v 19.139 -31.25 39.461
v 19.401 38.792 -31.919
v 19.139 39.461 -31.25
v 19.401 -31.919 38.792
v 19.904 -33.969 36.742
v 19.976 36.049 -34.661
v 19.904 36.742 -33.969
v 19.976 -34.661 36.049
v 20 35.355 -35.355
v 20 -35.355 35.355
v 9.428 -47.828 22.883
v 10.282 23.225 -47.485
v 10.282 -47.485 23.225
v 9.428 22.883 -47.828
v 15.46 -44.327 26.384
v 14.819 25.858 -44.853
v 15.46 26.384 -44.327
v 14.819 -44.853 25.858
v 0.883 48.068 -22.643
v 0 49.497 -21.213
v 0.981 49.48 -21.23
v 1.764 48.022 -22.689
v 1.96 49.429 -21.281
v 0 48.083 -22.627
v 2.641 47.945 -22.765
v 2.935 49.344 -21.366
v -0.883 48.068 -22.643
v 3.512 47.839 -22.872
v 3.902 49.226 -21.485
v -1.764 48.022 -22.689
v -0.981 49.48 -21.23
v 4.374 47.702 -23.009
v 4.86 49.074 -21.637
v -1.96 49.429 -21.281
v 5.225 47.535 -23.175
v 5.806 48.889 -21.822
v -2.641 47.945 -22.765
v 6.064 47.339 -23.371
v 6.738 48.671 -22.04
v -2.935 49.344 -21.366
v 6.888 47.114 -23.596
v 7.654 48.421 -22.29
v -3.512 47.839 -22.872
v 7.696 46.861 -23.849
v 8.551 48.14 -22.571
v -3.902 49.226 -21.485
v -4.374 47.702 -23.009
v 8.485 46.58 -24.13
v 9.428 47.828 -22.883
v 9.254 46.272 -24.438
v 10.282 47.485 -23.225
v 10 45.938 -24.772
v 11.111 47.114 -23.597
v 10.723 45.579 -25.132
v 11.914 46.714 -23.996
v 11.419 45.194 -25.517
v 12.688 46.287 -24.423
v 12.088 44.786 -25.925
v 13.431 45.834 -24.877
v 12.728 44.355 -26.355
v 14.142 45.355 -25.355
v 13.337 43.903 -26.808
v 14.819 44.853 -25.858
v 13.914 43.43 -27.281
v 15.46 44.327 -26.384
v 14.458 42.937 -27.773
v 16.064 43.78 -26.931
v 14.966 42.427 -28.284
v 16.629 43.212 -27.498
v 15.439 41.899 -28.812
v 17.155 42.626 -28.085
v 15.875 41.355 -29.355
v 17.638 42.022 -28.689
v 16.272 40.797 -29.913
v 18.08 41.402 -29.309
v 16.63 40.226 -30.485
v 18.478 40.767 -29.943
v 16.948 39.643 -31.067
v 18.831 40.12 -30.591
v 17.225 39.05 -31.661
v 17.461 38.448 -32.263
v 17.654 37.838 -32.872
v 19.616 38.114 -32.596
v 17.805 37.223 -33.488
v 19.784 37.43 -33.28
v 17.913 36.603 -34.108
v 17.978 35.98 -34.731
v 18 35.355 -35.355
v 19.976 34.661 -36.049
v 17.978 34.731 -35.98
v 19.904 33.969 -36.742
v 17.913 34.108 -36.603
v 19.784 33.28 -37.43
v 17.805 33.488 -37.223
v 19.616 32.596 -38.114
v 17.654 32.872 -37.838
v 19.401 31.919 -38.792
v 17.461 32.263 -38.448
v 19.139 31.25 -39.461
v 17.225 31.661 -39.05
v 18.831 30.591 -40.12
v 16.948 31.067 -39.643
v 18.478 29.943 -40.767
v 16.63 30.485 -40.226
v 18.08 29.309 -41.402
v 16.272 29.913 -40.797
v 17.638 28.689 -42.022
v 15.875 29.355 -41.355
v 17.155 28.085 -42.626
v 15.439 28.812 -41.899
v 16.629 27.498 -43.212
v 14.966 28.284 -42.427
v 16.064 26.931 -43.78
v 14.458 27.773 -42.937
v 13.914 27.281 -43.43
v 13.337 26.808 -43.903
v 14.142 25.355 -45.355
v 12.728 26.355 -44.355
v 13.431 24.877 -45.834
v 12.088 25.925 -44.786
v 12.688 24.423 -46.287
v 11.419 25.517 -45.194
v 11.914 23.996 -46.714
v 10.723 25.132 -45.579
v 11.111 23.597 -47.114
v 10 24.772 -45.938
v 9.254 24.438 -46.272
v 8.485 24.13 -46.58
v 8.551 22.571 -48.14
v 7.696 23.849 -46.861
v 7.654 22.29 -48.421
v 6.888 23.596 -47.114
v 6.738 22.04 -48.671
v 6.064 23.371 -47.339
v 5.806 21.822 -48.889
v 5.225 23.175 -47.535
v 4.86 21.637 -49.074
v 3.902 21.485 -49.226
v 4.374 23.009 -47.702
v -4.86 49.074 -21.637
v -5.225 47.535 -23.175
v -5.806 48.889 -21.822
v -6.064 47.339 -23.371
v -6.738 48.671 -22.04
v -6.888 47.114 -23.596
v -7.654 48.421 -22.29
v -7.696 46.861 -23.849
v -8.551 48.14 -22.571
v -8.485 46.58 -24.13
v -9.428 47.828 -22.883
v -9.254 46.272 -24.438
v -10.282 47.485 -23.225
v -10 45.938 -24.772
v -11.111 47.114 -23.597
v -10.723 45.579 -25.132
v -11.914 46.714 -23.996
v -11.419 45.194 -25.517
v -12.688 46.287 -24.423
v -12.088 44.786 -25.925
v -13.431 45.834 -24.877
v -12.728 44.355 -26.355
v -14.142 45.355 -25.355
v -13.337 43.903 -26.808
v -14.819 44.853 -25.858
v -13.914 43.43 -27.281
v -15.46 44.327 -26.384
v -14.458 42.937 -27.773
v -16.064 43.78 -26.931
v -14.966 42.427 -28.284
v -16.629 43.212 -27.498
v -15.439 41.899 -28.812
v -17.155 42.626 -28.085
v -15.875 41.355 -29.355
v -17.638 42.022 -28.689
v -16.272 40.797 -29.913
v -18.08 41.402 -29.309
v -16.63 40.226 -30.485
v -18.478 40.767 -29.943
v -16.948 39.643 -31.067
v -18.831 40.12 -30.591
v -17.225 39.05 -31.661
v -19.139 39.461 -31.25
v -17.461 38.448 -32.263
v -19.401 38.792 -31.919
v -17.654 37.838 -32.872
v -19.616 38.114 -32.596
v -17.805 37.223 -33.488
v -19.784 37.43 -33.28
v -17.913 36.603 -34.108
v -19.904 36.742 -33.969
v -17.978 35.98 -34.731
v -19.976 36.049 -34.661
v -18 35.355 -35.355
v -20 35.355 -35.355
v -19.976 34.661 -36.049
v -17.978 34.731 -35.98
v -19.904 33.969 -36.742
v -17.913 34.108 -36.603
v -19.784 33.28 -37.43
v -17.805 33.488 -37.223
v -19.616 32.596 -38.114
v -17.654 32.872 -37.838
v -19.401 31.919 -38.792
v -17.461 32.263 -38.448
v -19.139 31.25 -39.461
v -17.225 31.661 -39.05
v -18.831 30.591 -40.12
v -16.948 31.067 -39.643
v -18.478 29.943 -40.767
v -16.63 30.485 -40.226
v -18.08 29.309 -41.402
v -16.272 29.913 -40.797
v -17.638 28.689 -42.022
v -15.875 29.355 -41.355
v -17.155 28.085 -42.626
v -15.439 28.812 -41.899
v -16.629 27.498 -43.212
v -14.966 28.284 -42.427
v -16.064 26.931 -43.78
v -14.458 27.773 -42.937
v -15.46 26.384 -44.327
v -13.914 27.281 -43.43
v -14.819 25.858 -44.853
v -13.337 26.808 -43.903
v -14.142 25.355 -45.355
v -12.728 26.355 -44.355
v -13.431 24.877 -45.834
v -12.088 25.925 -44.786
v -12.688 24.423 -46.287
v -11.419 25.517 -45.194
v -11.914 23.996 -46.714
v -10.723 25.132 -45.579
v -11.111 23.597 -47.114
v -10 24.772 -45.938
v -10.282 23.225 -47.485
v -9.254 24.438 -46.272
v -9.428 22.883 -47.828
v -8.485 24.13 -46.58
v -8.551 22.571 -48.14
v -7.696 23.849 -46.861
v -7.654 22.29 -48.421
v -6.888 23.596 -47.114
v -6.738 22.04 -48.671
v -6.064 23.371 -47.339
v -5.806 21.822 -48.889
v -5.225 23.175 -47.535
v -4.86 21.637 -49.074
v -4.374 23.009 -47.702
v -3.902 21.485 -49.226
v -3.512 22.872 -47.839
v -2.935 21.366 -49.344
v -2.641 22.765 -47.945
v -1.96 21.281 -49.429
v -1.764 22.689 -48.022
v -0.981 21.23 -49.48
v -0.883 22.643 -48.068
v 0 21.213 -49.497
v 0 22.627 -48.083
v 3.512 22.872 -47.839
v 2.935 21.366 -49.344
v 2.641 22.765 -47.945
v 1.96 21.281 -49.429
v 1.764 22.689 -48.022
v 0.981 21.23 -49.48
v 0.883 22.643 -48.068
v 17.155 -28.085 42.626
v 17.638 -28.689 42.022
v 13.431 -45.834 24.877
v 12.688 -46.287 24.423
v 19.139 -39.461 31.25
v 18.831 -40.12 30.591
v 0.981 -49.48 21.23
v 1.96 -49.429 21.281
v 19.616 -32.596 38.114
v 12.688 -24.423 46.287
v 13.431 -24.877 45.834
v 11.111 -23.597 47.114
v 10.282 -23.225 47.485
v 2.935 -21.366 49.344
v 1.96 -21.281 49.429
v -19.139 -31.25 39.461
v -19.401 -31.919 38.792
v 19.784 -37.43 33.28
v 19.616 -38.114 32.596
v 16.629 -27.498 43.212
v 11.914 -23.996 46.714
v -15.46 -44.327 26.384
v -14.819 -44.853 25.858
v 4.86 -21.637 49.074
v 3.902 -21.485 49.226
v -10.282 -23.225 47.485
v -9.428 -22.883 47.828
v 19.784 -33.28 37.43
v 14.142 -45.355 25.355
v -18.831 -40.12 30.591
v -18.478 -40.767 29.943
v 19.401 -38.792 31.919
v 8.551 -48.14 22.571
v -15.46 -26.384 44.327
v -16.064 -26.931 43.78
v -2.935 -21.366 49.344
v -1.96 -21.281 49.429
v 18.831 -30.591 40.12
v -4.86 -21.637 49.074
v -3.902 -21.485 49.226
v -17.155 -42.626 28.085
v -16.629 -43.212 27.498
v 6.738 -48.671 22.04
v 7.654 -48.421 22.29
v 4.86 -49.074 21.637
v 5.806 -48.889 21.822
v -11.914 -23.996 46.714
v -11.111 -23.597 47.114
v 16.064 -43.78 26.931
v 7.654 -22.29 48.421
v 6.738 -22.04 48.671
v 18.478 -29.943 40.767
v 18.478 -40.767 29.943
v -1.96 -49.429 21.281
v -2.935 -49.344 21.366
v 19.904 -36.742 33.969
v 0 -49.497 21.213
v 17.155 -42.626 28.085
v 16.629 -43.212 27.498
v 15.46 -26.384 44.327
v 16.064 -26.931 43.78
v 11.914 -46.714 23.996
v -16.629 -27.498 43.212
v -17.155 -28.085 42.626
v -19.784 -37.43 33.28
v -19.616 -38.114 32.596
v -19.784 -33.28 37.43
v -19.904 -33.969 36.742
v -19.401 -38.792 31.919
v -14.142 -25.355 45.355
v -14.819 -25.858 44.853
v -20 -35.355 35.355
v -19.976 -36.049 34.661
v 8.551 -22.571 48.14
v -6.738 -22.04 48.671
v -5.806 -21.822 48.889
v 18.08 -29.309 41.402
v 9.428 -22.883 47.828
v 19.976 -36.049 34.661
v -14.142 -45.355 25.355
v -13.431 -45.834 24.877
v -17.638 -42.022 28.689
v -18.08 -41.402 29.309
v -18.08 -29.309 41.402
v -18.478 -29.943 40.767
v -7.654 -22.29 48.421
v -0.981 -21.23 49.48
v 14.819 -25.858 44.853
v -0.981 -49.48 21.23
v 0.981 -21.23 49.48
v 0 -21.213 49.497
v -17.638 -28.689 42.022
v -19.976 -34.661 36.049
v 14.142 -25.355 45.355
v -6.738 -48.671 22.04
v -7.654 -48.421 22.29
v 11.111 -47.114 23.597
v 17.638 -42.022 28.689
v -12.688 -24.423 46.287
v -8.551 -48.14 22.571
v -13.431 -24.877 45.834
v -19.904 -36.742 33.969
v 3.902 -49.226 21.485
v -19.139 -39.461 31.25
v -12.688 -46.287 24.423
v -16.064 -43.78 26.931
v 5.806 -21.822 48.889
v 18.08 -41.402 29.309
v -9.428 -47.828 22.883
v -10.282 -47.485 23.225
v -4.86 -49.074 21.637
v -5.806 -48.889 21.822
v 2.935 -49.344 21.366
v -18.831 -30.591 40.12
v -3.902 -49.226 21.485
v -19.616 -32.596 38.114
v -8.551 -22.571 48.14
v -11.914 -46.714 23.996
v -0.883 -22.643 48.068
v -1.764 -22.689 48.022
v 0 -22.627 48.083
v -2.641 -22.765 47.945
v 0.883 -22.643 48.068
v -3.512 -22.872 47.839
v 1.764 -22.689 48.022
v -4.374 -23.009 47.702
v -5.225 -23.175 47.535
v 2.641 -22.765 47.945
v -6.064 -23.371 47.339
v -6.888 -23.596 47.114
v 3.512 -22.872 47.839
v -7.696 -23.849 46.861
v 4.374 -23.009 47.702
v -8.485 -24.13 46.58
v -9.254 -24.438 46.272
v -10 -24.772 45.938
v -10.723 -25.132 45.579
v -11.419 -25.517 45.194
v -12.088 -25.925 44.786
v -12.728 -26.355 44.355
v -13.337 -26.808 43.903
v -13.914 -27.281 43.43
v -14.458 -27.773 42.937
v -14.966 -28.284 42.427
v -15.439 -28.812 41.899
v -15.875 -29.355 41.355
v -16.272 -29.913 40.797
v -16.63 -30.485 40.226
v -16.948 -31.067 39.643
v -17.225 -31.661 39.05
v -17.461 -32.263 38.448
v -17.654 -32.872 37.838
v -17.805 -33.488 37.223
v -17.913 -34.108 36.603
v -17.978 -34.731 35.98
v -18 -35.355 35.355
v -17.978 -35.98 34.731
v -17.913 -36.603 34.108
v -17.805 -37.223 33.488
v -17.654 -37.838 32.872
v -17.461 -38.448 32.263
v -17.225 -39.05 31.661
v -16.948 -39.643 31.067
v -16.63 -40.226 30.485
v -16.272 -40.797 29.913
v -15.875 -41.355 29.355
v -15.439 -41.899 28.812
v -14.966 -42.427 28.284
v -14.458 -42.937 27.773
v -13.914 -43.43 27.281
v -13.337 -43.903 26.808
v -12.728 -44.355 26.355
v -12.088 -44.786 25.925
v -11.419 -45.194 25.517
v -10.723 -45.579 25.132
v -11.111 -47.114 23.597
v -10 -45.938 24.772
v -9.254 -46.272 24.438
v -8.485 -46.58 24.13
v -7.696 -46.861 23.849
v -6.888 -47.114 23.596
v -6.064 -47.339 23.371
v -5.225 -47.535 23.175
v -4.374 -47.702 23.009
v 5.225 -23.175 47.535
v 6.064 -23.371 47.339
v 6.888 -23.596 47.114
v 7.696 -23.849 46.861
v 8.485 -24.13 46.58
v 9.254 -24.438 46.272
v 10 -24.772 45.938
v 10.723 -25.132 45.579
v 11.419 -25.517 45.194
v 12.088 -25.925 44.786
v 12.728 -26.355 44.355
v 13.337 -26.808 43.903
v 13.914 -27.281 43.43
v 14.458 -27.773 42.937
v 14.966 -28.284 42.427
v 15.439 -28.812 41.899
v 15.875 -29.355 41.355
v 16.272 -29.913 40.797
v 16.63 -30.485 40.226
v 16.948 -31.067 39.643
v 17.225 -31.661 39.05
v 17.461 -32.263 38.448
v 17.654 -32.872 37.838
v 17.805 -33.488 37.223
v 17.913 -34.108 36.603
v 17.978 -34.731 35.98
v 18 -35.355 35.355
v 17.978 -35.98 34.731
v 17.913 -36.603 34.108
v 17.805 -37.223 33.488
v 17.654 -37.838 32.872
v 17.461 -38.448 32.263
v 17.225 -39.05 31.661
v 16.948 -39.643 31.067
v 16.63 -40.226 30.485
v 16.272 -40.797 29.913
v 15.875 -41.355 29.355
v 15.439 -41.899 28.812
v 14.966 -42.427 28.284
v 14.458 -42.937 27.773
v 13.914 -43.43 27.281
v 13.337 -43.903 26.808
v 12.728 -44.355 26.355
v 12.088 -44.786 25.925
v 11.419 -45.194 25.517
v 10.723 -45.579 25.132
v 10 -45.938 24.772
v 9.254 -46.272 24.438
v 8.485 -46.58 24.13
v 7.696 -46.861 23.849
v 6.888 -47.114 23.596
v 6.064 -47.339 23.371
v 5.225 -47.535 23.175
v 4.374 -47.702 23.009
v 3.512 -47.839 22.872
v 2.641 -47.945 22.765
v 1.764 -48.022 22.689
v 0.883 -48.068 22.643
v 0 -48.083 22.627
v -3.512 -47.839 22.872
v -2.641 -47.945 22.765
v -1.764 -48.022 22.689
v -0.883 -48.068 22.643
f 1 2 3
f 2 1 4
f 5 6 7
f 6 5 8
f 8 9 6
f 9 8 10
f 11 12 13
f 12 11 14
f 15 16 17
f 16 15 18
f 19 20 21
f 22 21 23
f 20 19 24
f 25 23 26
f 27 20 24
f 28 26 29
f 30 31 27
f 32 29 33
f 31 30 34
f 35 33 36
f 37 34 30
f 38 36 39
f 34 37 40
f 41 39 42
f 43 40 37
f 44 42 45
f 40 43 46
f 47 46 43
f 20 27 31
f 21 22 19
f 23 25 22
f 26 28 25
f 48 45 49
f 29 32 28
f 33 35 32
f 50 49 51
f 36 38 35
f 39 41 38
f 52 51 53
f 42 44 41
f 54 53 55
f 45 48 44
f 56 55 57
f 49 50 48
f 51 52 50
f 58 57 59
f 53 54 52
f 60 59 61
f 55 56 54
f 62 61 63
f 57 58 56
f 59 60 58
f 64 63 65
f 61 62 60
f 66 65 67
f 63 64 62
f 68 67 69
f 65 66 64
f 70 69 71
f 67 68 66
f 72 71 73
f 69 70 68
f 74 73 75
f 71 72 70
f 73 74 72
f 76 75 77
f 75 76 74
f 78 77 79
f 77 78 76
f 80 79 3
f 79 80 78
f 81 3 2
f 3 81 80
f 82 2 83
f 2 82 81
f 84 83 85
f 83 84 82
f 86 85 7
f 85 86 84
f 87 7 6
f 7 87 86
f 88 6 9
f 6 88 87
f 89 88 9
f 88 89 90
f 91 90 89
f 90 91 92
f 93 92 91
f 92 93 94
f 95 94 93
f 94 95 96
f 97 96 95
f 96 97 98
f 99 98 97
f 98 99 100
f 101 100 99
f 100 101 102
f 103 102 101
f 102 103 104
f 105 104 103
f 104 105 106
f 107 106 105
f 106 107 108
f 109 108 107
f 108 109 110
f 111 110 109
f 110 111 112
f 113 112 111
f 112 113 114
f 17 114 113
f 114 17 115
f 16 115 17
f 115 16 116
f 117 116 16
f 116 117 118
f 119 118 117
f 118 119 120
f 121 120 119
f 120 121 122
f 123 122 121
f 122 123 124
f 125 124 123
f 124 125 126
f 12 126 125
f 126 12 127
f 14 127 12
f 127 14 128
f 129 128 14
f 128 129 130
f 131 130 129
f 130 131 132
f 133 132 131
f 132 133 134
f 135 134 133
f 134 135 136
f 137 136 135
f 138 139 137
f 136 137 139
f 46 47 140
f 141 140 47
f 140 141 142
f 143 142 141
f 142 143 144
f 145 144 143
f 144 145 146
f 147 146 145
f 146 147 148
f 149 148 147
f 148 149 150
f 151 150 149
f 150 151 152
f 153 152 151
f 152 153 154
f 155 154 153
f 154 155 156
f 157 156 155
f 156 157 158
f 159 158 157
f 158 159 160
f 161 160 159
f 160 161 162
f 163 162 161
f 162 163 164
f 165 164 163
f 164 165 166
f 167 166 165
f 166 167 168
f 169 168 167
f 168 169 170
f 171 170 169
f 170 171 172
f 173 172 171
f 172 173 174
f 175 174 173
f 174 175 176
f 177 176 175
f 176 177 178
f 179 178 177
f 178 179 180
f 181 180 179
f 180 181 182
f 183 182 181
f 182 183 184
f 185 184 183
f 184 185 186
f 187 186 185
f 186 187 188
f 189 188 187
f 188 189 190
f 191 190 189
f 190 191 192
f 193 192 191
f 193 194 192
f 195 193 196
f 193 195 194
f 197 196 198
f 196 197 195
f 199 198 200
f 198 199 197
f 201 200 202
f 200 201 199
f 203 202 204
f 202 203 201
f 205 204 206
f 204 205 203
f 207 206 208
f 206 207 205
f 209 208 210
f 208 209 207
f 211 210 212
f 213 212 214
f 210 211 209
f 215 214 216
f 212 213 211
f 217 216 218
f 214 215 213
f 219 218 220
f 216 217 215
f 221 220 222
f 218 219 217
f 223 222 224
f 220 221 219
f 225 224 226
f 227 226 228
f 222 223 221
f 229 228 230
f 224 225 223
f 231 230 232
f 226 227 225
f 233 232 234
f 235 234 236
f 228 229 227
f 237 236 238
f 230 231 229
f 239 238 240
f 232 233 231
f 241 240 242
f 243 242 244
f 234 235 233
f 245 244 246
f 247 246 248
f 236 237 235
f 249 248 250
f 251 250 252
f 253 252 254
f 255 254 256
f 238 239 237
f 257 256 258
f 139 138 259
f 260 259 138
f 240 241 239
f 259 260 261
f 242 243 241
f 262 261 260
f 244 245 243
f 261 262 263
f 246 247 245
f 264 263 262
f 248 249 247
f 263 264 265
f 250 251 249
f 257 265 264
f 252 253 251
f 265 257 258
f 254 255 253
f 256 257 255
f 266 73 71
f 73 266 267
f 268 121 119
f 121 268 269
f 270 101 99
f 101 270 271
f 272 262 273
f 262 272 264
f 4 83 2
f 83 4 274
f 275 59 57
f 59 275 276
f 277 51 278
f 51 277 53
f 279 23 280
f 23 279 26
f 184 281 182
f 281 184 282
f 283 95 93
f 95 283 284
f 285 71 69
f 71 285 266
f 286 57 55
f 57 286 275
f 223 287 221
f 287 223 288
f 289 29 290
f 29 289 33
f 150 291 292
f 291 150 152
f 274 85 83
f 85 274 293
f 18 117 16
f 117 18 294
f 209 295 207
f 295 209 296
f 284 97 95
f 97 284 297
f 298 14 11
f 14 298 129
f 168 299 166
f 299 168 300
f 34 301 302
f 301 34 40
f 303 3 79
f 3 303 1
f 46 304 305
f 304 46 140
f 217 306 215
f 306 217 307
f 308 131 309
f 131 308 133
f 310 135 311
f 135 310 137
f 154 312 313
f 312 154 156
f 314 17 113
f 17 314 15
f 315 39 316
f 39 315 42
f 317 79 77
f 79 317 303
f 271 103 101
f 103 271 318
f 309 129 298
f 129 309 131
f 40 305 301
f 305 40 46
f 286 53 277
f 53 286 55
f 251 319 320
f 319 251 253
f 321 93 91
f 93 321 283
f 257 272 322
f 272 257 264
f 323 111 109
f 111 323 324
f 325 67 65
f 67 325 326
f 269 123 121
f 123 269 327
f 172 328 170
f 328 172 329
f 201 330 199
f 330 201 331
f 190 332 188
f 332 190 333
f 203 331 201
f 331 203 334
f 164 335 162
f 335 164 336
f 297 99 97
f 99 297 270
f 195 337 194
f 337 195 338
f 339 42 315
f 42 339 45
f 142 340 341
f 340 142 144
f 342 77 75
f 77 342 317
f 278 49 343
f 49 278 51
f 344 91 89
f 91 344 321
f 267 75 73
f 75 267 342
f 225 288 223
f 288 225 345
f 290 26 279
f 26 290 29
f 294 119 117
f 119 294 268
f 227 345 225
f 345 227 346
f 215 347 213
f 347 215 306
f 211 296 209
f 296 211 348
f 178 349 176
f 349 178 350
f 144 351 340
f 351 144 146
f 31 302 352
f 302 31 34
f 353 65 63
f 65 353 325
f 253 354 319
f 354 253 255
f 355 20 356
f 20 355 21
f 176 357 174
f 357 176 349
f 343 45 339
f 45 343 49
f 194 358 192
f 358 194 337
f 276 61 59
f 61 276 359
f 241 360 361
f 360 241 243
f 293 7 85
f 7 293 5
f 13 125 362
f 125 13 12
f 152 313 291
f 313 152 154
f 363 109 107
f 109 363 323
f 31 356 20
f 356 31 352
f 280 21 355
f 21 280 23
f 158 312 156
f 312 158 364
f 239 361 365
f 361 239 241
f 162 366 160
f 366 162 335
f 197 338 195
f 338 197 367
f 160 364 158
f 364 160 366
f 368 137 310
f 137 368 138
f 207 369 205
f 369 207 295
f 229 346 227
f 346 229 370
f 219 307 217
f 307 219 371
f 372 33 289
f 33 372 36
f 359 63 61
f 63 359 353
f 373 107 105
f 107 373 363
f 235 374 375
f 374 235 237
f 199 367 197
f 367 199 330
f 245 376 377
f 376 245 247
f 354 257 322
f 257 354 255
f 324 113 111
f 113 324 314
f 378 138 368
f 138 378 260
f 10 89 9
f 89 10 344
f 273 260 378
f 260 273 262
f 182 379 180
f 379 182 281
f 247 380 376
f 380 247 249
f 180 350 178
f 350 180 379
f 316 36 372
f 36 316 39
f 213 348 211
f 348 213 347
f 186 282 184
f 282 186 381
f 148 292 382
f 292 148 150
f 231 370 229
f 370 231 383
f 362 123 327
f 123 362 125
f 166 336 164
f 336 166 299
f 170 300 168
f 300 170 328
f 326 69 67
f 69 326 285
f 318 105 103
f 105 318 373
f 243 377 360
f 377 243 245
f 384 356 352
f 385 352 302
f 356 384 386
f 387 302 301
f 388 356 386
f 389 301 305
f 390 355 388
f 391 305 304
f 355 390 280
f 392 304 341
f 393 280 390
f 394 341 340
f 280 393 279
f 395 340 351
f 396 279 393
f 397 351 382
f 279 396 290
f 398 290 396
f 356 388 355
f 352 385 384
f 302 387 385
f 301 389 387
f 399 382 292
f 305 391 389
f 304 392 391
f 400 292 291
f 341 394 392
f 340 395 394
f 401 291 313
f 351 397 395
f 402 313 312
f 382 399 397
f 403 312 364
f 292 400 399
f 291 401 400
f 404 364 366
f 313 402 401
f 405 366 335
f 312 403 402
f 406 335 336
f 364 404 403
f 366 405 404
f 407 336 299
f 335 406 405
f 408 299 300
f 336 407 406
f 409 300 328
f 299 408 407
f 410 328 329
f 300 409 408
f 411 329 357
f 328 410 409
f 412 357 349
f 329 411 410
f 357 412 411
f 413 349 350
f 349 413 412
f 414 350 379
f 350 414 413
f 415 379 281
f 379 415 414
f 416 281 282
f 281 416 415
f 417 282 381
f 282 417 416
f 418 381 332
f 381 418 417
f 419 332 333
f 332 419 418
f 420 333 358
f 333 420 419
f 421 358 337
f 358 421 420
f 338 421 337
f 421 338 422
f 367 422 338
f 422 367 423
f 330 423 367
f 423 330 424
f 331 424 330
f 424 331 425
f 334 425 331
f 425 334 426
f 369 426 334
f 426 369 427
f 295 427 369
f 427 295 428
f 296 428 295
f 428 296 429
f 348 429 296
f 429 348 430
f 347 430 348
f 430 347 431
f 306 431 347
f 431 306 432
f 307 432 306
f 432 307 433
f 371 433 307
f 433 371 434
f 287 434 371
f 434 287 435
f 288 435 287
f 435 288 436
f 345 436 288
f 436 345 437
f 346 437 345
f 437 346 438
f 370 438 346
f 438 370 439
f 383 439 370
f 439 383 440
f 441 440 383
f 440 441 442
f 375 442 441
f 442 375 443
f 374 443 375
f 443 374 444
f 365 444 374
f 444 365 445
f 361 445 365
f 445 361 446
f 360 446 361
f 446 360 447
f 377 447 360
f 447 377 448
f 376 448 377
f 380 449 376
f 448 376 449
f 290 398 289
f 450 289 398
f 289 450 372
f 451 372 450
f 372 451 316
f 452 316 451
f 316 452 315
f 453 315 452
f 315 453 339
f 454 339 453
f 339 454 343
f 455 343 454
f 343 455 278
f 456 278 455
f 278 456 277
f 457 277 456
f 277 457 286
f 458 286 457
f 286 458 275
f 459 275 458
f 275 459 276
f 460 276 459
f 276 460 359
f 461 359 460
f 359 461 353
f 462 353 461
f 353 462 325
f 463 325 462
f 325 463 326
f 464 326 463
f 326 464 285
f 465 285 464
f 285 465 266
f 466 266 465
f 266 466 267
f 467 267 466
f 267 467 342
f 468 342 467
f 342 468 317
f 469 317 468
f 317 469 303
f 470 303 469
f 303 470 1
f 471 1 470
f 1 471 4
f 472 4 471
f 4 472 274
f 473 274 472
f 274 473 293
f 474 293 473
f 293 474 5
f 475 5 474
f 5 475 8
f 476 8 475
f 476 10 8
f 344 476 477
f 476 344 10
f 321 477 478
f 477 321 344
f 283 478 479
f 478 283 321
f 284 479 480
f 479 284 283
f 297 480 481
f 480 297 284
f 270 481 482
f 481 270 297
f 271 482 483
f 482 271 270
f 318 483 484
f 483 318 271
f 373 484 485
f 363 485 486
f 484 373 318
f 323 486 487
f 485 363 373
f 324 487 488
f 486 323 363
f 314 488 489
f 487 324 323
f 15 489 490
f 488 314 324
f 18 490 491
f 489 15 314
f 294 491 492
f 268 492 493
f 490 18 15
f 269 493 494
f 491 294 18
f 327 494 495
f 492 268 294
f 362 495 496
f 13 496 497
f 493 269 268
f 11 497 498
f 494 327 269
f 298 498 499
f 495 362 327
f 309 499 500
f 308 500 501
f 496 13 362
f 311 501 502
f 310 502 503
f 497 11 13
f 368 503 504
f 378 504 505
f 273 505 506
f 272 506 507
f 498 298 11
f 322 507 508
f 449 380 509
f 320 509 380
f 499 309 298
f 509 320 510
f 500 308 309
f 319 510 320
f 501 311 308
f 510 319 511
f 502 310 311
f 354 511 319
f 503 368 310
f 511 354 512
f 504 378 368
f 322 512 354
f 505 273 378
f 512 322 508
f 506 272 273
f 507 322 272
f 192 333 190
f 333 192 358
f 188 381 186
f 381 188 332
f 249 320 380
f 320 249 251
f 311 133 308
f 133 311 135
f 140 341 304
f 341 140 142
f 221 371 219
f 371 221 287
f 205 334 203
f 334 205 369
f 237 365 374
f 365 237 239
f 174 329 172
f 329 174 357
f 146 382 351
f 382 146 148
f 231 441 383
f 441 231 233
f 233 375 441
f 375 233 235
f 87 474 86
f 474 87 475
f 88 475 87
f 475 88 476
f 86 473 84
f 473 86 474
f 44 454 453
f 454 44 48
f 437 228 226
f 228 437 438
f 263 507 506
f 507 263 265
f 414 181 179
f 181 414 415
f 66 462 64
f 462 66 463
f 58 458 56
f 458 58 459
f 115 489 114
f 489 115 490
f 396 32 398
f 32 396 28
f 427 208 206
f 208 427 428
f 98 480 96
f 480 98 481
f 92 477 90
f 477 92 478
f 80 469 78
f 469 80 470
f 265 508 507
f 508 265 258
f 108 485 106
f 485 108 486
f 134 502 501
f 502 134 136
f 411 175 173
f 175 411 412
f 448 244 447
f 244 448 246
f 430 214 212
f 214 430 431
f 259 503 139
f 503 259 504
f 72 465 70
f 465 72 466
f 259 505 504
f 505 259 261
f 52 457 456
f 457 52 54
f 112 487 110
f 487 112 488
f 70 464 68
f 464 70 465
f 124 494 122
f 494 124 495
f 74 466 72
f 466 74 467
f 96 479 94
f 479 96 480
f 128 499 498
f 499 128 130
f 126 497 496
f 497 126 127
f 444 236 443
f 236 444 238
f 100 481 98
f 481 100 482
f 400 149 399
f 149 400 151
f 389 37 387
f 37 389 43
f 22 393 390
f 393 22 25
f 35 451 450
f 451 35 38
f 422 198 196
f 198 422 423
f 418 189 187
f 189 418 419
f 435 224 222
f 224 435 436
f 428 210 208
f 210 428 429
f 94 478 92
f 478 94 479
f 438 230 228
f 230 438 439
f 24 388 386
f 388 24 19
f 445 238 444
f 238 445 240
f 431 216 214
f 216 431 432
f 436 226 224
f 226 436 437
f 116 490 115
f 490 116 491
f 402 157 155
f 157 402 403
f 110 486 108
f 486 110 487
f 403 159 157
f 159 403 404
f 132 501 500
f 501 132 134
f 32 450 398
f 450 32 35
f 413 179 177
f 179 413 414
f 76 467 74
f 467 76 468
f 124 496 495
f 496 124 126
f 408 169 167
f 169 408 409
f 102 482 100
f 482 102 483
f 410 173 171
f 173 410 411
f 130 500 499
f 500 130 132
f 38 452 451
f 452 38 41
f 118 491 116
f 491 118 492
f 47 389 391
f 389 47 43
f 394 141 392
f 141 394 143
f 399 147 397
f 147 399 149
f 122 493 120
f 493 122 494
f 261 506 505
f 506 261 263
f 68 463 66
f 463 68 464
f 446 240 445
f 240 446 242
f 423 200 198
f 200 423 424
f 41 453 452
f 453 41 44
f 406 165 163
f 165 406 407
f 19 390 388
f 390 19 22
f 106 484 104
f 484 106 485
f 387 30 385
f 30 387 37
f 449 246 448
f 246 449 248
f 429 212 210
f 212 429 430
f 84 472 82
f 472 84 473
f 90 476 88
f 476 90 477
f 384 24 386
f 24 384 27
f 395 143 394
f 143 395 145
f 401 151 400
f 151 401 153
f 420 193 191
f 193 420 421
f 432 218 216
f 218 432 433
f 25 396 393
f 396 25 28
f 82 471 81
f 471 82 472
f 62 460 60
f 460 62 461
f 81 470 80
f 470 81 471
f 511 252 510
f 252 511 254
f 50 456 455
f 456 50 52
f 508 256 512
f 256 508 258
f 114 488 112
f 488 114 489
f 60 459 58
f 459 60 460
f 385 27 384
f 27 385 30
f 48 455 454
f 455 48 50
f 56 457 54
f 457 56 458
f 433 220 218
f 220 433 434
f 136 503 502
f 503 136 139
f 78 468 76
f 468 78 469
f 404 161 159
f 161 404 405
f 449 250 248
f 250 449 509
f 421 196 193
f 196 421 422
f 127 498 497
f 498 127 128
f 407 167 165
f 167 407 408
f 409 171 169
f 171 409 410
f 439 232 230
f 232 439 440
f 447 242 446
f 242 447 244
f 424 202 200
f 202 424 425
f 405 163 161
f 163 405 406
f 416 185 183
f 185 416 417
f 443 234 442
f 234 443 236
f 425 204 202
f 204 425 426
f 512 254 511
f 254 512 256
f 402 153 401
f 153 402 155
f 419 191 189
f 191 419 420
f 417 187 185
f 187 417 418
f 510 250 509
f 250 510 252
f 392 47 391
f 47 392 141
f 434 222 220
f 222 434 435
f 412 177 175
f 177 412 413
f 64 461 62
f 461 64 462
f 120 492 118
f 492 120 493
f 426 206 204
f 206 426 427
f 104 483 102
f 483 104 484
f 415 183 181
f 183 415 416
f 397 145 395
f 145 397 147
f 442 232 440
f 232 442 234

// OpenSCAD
rotate([45,0,0])
 color([0.5,0.5,0.5])
 difference() {
 cylinder(r=20, h=100, center=true, $fn=128);
 cylinder(r=18, h=104, center=true, $fn=128);
 }
